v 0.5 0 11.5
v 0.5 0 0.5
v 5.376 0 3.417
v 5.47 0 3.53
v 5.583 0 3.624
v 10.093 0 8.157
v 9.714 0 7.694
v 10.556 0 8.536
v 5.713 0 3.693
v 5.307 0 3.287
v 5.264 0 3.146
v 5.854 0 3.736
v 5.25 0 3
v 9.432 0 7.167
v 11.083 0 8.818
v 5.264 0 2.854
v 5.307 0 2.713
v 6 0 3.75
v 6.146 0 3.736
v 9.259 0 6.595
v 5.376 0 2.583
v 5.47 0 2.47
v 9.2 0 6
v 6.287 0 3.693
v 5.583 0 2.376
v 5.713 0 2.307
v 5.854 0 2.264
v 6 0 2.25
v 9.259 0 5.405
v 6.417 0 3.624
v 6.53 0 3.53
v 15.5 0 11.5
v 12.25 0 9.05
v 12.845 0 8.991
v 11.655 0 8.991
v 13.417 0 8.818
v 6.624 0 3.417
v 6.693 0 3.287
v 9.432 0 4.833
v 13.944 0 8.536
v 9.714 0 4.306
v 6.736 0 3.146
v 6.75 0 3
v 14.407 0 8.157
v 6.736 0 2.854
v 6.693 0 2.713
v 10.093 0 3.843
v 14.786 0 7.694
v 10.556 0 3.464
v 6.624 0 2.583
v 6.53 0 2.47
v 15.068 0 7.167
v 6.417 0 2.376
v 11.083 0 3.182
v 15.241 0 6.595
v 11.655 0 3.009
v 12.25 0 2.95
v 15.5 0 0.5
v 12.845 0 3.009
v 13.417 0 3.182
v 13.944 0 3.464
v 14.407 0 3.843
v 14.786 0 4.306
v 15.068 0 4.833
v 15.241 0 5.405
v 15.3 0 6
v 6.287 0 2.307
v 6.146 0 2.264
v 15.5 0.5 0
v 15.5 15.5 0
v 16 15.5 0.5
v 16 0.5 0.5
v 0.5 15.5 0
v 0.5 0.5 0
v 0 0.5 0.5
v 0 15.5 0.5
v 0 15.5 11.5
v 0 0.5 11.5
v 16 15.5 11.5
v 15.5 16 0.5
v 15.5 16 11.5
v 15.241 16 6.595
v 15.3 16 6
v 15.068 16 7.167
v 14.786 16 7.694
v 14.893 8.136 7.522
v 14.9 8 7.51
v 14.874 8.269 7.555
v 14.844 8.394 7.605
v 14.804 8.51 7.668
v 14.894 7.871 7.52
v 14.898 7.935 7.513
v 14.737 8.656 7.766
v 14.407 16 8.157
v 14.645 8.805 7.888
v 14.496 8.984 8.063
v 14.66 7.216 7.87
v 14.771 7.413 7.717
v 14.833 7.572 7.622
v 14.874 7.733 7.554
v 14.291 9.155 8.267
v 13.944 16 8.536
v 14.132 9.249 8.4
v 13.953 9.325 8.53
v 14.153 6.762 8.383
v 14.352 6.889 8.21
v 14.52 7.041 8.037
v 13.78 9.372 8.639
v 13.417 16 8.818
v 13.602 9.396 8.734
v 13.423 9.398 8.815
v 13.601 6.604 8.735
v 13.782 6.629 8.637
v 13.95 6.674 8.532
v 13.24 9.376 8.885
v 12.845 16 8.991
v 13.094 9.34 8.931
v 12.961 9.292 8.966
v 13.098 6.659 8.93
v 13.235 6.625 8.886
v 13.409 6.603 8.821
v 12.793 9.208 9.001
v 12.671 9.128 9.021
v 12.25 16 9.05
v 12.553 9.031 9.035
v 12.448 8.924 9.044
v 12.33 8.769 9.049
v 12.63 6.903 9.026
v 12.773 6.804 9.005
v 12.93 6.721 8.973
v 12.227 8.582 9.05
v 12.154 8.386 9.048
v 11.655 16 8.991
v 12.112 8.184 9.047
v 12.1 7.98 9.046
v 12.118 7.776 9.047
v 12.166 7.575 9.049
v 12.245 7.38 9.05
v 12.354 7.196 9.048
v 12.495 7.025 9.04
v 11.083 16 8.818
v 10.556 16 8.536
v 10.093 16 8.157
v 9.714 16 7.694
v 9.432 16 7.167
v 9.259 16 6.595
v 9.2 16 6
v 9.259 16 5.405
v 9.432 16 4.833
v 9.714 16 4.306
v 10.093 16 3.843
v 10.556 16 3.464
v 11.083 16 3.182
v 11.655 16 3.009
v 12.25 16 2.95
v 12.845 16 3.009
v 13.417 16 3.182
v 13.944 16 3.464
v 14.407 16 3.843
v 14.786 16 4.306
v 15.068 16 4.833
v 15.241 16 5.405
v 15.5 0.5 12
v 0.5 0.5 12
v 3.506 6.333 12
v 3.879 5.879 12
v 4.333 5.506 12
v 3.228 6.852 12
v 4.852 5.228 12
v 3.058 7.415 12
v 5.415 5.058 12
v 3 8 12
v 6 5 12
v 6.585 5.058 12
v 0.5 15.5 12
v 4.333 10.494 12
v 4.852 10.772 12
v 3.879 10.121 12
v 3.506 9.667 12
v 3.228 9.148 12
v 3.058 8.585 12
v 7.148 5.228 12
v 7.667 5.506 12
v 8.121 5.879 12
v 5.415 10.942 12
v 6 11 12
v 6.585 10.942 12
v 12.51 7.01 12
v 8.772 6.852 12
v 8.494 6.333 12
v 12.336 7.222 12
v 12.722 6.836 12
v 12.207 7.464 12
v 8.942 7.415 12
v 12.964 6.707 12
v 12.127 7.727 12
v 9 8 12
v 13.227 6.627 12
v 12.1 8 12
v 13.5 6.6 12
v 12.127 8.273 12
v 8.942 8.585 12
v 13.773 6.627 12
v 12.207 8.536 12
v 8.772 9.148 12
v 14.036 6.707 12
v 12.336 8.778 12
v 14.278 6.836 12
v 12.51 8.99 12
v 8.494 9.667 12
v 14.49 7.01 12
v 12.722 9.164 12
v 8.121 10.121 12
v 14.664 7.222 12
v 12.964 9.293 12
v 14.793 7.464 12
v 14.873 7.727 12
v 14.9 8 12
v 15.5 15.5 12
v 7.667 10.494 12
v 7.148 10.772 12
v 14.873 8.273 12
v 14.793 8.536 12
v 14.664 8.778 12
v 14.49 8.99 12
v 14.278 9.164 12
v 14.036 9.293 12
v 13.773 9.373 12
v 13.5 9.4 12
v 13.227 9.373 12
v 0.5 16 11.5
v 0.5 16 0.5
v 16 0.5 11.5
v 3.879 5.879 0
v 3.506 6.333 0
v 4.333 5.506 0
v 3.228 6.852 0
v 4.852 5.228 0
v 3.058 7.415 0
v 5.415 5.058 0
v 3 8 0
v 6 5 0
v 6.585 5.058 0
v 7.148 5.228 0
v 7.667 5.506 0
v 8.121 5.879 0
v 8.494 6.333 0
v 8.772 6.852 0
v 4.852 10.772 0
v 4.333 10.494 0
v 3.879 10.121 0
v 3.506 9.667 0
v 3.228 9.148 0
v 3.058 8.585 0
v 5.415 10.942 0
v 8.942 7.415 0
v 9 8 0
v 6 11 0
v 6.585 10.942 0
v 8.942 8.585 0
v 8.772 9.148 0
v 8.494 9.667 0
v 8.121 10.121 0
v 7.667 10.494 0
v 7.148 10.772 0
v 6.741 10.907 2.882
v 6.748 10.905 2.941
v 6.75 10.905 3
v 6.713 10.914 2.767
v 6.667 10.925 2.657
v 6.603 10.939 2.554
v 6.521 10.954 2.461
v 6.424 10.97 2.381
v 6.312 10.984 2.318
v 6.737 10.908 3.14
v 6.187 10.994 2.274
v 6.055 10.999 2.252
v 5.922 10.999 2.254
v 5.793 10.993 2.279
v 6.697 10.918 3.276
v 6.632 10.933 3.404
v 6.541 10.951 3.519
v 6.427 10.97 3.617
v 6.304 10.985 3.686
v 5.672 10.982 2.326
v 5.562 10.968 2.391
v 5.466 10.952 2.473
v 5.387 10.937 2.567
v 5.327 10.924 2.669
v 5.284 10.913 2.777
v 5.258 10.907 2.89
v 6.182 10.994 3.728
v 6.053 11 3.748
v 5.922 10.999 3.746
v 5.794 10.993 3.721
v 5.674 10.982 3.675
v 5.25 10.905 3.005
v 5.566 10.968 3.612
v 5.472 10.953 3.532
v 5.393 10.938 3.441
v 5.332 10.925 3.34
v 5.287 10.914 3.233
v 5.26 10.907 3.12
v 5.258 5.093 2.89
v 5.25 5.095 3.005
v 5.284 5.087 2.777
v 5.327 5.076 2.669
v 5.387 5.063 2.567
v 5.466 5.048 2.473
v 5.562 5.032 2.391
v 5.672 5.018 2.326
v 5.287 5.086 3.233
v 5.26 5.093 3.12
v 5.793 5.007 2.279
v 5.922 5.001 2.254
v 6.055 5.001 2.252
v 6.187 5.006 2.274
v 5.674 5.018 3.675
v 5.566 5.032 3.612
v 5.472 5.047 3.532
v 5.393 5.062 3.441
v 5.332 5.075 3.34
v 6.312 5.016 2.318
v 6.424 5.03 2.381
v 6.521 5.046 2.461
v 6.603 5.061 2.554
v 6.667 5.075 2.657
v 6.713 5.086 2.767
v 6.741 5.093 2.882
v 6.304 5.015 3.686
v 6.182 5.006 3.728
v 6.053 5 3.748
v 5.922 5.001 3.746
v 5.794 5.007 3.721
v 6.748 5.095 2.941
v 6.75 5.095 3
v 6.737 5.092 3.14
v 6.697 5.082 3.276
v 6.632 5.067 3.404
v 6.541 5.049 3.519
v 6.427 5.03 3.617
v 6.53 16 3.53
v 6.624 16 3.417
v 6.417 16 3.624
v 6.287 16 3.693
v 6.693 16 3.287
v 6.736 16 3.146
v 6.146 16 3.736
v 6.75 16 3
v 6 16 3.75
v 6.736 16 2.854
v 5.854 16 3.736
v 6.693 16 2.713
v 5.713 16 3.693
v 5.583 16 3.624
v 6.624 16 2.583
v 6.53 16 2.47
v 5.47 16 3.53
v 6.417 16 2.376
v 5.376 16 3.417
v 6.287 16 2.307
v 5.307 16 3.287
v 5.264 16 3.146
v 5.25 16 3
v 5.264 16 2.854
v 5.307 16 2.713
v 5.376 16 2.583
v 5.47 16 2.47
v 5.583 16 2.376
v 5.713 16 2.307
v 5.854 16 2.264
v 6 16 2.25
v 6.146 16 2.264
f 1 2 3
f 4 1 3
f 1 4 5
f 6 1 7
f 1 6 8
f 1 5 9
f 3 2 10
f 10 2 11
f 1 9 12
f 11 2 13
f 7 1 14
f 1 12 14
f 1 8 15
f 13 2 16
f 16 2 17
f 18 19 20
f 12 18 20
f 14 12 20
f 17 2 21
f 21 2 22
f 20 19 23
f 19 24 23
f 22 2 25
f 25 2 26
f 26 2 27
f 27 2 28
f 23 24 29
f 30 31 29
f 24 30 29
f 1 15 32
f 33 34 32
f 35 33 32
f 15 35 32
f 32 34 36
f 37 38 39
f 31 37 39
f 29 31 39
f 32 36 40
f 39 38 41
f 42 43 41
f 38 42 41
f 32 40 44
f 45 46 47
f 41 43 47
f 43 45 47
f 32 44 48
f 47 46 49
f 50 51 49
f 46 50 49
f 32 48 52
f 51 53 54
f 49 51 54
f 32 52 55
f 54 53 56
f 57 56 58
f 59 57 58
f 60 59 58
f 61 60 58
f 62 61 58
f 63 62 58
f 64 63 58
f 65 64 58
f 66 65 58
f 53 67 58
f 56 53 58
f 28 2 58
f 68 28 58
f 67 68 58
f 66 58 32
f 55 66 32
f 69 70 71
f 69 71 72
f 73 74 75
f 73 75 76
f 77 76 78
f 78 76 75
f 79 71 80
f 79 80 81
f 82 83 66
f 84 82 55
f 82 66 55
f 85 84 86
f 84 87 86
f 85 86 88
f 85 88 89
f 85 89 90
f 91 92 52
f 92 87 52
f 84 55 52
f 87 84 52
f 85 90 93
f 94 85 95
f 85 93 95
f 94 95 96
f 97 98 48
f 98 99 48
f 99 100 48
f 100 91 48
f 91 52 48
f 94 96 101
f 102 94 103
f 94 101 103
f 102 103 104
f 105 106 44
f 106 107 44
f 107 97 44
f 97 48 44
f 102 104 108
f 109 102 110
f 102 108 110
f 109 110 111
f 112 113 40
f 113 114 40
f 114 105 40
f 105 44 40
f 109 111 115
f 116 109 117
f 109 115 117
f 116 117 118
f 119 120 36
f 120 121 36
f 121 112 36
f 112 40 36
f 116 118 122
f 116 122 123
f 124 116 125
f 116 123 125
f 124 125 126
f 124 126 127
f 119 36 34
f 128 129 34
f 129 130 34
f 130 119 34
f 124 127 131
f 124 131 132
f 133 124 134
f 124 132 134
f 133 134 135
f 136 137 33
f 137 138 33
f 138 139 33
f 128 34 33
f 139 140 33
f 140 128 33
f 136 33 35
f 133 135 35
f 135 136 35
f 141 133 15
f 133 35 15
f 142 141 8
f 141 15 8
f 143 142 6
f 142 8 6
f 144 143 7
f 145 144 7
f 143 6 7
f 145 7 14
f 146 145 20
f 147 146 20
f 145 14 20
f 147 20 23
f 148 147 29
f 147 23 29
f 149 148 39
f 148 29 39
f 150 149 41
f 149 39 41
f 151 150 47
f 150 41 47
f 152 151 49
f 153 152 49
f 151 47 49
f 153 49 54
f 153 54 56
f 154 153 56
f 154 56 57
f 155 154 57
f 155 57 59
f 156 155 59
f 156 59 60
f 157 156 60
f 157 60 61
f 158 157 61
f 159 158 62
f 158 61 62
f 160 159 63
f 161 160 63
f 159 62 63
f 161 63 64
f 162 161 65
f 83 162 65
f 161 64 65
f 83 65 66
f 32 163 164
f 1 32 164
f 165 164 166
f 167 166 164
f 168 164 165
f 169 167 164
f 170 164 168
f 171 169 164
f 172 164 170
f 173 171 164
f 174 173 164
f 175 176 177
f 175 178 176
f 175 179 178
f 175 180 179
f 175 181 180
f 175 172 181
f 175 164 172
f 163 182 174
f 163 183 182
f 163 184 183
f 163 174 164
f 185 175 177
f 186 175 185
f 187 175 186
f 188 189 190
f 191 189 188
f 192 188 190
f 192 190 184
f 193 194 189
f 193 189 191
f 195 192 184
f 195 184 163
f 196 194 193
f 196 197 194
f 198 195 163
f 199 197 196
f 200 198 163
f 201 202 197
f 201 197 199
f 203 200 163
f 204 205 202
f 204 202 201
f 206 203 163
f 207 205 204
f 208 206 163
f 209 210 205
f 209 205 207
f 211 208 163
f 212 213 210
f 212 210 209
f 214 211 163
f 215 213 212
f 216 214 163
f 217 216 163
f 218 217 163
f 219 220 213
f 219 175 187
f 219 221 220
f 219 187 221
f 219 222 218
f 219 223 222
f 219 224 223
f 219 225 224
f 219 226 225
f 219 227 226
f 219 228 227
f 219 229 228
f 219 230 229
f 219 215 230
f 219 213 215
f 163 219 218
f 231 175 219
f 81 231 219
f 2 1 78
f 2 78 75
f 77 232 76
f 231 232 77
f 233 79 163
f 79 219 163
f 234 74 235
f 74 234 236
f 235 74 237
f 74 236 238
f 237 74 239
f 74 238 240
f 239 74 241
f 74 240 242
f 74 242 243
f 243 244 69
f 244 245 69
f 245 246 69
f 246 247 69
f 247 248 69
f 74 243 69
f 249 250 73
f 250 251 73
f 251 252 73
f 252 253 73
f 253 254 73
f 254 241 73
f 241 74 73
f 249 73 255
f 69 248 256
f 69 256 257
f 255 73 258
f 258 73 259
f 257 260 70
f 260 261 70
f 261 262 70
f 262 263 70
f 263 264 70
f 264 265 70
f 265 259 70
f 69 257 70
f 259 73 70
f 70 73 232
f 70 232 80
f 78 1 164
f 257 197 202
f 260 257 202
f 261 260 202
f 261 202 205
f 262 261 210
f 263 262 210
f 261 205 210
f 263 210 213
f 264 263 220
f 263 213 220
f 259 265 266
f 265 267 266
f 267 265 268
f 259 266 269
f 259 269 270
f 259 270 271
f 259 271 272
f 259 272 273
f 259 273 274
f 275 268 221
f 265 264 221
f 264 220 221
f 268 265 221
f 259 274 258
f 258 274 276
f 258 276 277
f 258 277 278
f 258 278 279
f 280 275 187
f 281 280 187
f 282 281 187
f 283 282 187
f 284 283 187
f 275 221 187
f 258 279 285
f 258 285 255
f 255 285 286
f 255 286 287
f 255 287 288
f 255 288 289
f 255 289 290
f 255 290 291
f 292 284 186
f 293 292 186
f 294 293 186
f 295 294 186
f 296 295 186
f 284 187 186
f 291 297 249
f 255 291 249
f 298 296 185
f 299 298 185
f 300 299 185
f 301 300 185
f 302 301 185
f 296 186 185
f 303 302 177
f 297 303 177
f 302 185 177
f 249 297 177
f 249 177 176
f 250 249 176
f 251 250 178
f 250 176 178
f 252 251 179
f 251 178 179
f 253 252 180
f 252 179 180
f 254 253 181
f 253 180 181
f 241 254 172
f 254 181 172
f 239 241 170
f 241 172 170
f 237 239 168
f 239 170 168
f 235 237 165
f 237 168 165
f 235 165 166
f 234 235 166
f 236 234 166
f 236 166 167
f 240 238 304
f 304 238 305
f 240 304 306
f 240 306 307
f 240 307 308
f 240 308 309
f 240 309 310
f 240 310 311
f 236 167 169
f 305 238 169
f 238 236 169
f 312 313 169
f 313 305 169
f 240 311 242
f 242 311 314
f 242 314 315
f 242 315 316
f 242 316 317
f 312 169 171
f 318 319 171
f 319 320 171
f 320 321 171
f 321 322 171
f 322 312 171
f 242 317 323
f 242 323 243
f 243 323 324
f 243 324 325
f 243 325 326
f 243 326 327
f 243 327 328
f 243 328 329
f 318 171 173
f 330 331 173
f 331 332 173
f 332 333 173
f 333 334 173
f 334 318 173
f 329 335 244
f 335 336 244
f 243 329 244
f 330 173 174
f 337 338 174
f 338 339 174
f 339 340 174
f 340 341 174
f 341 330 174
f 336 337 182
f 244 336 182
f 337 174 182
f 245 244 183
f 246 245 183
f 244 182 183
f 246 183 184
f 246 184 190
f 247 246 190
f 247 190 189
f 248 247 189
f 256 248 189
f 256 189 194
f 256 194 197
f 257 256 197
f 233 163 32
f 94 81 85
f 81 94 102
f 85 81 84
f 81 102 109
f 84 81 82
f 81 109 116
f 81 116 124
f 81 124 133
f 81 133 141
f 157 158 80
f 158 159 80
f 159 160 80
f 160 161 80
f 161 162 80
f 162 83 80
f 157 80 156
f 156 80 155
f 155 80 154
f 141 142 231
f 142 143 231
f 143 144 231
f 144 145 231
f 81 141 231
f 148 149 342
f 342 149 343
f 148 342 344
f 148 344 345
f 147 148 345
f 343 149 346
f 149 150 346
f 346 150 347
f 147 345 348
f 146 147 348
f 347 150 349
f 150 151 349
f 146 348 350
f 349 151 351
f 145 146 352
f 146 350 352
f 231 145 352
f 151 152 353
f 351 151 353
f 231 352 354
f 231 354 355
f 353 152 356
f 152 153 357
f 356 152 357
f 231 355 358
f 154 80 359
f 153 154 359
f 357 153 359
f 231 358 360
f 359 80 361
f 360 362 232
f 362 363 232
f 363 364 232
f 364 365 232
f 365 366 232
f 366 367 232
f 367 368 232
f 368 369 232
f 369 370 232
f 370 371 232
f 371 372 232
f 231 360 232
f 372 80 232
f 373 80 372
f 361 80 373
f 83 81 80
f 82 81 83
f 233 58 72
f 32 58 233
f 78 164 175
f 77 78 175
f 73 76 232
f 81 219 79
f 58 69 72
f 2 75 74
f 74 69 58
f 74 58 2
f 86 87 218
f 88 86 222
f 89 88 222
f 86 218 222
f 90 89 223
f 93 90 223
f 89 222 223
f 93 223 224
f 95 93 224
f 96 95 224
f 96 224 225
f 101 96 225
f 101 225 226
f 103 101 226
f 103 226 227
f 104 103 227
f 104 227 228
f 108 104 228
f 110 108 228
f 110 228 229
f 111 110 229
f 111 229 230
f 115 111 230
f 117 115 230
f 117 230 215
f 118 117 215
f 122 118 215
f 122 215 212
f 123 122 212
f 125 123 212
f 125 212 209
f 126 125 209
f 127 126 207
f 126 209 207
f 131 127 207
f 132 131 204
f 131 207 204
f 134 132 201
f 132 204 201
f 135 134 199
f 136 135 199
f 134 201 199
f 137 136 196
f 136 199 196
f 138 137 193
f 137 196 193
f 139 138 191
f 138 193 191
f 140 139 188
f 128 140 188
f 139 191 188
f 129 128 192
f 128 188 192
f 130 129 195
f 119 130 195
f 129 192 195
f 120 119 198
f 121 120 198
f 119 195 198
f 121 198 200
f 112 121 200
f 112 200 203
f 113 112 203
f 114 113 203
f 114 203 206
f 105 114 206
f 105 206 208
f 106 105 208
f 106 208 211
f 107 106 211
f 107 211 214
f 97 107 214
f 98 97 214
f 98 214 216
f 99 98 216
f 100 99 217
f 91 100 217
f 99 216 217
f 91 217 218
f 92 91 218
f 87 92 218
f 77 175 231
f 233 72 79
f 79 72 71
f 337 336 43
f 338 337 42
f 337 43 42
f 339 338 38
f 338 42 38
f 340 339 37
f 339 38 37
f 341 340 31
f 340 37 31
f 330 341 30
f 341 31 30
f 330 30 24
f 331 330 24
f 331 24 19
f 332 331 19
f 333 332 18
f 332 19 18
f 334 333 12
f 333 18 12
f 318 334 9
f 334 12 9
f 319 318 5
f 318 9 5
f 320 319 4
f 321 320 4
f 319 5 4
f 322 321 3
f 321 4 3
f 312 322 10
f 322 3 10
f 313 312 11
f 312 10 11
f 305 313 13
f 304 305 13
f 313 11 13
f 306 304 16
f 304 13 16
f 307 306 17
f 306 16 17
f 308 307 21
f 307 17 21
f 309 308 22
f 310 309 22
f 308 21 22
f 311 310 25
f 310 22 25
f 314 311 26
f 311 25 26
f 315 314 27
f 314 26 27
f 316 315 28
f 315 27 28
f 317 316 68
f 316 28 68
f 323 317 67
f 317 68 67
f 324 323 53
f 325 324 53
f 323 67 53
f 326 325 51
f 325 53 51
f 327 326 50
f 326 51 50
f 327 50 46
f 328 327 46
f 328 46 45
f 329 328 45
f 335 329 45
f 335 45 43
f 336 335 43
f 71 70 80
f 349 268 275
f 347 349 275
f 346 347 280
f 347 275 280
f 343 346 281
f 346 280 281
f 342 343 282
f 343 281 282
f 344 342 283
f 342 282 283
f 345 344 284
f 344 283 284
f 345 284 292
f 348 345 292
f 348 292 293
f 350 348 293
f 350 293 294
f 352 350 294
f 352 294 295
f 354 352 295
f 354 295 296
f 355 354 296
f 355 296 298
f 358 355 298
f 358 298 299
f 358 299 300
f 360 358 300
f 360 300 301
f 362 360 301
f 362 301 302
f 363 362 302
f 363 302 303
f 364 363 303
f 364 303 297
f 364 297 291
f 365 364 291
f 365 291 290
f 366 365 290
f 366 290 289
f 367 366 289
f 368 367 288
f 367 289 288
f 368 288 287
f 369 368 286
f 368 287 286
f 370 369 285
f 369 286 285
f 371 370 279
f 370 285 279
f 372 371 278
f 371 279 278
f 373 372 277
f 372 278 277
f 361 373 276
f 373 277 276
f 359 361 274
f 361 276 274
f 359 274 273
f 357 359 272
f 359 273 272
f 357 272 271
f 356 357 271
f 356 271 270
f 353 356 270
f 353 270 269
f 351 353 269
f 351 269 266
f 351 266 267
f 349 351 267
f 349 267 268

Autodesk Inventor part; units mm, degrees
ref_plane "YZ Plane" through (0, 0, 0) normal (1, 0, 0) x (0, 1, 0)
ref_plane "XZ Plane" through (0, 0, 0) normal (0, 1, 0) x (-1, 0, 0)
ref_plane "XY Plane" through (0, 0, 0) normal (0, 0, 1) x (1, 0, 0)
sketch "Sketch1" plane through (0, 0, 0) normal (0, 0, 1) x (1, 0, 0)
  line L0 (0, 0) -> (16, 0)
  line L1 (16, 0) -> (16, 16)
  line L2 (16, 16) -> (0, 16)
  line L3 (0, 16) -> (0, 0)
  dimension "d0" = 16
  dimension "d1" = 16
extrude "Extrusion1" add sketch "Sketch1" along normal blind 12
sketch "Sketch3" plane through (0, 0, 0) normal (0, -1, 0) x (1, 0, 0)
  line L0 (0, 0) -> (16, 0) projected
  line L1 (0, 0) -> (0, 12) projected
  circle A0 centre (6, 3) radius 0.75
  circle A1 centre (12.25, 6) radius 3.05
  dimension "d10" = 6.1
  dimension "d11" = 1.5
  dimension "d12" = 3
  dimension "d13" = 6
  dimension "d14" = 6
  dimension "d15" = 12.25
sketch "Sketch2" plane through (0, 0, 12) normal (0, 0, 1) x (1, 0, 0)
  line L0 (0, 16) -> (0, 0) projected
  circle A0 centre (6, 8) radius 3
  circle A1 centre (13.5, 8) radius 1.4
  point P0 (0, 8)
  dimension "d4" = 13.5
  dimension "d5" = 6
  dimension "d6" = 6
  dimension "d7" = 2.8
chamfer "Chamfer1" distance 0.5 angle 45 12 edges at (0, 0, 6) (8, 0, 12) (0, 8, 12) (8, 16, 12) (0, 16, 6) (0, 8, 0) (8, 16, 0) (8, 0, 0) (16, 8, 0) (16, 8, 12) (16, 0, 6) (16, 16, 6)
extrude "Extrusion4" cut sketch "Sketch3" against normal up to next
extrude "Extrusion5" cut sketch "Sketch2" against normal up to next
thread "Thread1" size "M6x1" class "6H" standard "ANSI Metric M Profile" full length
thread "Thread2" size "M3x0.5" class "6H" standard "ANSI Metric M Profile" full length
properties part number "E3D_Heaterblock"
